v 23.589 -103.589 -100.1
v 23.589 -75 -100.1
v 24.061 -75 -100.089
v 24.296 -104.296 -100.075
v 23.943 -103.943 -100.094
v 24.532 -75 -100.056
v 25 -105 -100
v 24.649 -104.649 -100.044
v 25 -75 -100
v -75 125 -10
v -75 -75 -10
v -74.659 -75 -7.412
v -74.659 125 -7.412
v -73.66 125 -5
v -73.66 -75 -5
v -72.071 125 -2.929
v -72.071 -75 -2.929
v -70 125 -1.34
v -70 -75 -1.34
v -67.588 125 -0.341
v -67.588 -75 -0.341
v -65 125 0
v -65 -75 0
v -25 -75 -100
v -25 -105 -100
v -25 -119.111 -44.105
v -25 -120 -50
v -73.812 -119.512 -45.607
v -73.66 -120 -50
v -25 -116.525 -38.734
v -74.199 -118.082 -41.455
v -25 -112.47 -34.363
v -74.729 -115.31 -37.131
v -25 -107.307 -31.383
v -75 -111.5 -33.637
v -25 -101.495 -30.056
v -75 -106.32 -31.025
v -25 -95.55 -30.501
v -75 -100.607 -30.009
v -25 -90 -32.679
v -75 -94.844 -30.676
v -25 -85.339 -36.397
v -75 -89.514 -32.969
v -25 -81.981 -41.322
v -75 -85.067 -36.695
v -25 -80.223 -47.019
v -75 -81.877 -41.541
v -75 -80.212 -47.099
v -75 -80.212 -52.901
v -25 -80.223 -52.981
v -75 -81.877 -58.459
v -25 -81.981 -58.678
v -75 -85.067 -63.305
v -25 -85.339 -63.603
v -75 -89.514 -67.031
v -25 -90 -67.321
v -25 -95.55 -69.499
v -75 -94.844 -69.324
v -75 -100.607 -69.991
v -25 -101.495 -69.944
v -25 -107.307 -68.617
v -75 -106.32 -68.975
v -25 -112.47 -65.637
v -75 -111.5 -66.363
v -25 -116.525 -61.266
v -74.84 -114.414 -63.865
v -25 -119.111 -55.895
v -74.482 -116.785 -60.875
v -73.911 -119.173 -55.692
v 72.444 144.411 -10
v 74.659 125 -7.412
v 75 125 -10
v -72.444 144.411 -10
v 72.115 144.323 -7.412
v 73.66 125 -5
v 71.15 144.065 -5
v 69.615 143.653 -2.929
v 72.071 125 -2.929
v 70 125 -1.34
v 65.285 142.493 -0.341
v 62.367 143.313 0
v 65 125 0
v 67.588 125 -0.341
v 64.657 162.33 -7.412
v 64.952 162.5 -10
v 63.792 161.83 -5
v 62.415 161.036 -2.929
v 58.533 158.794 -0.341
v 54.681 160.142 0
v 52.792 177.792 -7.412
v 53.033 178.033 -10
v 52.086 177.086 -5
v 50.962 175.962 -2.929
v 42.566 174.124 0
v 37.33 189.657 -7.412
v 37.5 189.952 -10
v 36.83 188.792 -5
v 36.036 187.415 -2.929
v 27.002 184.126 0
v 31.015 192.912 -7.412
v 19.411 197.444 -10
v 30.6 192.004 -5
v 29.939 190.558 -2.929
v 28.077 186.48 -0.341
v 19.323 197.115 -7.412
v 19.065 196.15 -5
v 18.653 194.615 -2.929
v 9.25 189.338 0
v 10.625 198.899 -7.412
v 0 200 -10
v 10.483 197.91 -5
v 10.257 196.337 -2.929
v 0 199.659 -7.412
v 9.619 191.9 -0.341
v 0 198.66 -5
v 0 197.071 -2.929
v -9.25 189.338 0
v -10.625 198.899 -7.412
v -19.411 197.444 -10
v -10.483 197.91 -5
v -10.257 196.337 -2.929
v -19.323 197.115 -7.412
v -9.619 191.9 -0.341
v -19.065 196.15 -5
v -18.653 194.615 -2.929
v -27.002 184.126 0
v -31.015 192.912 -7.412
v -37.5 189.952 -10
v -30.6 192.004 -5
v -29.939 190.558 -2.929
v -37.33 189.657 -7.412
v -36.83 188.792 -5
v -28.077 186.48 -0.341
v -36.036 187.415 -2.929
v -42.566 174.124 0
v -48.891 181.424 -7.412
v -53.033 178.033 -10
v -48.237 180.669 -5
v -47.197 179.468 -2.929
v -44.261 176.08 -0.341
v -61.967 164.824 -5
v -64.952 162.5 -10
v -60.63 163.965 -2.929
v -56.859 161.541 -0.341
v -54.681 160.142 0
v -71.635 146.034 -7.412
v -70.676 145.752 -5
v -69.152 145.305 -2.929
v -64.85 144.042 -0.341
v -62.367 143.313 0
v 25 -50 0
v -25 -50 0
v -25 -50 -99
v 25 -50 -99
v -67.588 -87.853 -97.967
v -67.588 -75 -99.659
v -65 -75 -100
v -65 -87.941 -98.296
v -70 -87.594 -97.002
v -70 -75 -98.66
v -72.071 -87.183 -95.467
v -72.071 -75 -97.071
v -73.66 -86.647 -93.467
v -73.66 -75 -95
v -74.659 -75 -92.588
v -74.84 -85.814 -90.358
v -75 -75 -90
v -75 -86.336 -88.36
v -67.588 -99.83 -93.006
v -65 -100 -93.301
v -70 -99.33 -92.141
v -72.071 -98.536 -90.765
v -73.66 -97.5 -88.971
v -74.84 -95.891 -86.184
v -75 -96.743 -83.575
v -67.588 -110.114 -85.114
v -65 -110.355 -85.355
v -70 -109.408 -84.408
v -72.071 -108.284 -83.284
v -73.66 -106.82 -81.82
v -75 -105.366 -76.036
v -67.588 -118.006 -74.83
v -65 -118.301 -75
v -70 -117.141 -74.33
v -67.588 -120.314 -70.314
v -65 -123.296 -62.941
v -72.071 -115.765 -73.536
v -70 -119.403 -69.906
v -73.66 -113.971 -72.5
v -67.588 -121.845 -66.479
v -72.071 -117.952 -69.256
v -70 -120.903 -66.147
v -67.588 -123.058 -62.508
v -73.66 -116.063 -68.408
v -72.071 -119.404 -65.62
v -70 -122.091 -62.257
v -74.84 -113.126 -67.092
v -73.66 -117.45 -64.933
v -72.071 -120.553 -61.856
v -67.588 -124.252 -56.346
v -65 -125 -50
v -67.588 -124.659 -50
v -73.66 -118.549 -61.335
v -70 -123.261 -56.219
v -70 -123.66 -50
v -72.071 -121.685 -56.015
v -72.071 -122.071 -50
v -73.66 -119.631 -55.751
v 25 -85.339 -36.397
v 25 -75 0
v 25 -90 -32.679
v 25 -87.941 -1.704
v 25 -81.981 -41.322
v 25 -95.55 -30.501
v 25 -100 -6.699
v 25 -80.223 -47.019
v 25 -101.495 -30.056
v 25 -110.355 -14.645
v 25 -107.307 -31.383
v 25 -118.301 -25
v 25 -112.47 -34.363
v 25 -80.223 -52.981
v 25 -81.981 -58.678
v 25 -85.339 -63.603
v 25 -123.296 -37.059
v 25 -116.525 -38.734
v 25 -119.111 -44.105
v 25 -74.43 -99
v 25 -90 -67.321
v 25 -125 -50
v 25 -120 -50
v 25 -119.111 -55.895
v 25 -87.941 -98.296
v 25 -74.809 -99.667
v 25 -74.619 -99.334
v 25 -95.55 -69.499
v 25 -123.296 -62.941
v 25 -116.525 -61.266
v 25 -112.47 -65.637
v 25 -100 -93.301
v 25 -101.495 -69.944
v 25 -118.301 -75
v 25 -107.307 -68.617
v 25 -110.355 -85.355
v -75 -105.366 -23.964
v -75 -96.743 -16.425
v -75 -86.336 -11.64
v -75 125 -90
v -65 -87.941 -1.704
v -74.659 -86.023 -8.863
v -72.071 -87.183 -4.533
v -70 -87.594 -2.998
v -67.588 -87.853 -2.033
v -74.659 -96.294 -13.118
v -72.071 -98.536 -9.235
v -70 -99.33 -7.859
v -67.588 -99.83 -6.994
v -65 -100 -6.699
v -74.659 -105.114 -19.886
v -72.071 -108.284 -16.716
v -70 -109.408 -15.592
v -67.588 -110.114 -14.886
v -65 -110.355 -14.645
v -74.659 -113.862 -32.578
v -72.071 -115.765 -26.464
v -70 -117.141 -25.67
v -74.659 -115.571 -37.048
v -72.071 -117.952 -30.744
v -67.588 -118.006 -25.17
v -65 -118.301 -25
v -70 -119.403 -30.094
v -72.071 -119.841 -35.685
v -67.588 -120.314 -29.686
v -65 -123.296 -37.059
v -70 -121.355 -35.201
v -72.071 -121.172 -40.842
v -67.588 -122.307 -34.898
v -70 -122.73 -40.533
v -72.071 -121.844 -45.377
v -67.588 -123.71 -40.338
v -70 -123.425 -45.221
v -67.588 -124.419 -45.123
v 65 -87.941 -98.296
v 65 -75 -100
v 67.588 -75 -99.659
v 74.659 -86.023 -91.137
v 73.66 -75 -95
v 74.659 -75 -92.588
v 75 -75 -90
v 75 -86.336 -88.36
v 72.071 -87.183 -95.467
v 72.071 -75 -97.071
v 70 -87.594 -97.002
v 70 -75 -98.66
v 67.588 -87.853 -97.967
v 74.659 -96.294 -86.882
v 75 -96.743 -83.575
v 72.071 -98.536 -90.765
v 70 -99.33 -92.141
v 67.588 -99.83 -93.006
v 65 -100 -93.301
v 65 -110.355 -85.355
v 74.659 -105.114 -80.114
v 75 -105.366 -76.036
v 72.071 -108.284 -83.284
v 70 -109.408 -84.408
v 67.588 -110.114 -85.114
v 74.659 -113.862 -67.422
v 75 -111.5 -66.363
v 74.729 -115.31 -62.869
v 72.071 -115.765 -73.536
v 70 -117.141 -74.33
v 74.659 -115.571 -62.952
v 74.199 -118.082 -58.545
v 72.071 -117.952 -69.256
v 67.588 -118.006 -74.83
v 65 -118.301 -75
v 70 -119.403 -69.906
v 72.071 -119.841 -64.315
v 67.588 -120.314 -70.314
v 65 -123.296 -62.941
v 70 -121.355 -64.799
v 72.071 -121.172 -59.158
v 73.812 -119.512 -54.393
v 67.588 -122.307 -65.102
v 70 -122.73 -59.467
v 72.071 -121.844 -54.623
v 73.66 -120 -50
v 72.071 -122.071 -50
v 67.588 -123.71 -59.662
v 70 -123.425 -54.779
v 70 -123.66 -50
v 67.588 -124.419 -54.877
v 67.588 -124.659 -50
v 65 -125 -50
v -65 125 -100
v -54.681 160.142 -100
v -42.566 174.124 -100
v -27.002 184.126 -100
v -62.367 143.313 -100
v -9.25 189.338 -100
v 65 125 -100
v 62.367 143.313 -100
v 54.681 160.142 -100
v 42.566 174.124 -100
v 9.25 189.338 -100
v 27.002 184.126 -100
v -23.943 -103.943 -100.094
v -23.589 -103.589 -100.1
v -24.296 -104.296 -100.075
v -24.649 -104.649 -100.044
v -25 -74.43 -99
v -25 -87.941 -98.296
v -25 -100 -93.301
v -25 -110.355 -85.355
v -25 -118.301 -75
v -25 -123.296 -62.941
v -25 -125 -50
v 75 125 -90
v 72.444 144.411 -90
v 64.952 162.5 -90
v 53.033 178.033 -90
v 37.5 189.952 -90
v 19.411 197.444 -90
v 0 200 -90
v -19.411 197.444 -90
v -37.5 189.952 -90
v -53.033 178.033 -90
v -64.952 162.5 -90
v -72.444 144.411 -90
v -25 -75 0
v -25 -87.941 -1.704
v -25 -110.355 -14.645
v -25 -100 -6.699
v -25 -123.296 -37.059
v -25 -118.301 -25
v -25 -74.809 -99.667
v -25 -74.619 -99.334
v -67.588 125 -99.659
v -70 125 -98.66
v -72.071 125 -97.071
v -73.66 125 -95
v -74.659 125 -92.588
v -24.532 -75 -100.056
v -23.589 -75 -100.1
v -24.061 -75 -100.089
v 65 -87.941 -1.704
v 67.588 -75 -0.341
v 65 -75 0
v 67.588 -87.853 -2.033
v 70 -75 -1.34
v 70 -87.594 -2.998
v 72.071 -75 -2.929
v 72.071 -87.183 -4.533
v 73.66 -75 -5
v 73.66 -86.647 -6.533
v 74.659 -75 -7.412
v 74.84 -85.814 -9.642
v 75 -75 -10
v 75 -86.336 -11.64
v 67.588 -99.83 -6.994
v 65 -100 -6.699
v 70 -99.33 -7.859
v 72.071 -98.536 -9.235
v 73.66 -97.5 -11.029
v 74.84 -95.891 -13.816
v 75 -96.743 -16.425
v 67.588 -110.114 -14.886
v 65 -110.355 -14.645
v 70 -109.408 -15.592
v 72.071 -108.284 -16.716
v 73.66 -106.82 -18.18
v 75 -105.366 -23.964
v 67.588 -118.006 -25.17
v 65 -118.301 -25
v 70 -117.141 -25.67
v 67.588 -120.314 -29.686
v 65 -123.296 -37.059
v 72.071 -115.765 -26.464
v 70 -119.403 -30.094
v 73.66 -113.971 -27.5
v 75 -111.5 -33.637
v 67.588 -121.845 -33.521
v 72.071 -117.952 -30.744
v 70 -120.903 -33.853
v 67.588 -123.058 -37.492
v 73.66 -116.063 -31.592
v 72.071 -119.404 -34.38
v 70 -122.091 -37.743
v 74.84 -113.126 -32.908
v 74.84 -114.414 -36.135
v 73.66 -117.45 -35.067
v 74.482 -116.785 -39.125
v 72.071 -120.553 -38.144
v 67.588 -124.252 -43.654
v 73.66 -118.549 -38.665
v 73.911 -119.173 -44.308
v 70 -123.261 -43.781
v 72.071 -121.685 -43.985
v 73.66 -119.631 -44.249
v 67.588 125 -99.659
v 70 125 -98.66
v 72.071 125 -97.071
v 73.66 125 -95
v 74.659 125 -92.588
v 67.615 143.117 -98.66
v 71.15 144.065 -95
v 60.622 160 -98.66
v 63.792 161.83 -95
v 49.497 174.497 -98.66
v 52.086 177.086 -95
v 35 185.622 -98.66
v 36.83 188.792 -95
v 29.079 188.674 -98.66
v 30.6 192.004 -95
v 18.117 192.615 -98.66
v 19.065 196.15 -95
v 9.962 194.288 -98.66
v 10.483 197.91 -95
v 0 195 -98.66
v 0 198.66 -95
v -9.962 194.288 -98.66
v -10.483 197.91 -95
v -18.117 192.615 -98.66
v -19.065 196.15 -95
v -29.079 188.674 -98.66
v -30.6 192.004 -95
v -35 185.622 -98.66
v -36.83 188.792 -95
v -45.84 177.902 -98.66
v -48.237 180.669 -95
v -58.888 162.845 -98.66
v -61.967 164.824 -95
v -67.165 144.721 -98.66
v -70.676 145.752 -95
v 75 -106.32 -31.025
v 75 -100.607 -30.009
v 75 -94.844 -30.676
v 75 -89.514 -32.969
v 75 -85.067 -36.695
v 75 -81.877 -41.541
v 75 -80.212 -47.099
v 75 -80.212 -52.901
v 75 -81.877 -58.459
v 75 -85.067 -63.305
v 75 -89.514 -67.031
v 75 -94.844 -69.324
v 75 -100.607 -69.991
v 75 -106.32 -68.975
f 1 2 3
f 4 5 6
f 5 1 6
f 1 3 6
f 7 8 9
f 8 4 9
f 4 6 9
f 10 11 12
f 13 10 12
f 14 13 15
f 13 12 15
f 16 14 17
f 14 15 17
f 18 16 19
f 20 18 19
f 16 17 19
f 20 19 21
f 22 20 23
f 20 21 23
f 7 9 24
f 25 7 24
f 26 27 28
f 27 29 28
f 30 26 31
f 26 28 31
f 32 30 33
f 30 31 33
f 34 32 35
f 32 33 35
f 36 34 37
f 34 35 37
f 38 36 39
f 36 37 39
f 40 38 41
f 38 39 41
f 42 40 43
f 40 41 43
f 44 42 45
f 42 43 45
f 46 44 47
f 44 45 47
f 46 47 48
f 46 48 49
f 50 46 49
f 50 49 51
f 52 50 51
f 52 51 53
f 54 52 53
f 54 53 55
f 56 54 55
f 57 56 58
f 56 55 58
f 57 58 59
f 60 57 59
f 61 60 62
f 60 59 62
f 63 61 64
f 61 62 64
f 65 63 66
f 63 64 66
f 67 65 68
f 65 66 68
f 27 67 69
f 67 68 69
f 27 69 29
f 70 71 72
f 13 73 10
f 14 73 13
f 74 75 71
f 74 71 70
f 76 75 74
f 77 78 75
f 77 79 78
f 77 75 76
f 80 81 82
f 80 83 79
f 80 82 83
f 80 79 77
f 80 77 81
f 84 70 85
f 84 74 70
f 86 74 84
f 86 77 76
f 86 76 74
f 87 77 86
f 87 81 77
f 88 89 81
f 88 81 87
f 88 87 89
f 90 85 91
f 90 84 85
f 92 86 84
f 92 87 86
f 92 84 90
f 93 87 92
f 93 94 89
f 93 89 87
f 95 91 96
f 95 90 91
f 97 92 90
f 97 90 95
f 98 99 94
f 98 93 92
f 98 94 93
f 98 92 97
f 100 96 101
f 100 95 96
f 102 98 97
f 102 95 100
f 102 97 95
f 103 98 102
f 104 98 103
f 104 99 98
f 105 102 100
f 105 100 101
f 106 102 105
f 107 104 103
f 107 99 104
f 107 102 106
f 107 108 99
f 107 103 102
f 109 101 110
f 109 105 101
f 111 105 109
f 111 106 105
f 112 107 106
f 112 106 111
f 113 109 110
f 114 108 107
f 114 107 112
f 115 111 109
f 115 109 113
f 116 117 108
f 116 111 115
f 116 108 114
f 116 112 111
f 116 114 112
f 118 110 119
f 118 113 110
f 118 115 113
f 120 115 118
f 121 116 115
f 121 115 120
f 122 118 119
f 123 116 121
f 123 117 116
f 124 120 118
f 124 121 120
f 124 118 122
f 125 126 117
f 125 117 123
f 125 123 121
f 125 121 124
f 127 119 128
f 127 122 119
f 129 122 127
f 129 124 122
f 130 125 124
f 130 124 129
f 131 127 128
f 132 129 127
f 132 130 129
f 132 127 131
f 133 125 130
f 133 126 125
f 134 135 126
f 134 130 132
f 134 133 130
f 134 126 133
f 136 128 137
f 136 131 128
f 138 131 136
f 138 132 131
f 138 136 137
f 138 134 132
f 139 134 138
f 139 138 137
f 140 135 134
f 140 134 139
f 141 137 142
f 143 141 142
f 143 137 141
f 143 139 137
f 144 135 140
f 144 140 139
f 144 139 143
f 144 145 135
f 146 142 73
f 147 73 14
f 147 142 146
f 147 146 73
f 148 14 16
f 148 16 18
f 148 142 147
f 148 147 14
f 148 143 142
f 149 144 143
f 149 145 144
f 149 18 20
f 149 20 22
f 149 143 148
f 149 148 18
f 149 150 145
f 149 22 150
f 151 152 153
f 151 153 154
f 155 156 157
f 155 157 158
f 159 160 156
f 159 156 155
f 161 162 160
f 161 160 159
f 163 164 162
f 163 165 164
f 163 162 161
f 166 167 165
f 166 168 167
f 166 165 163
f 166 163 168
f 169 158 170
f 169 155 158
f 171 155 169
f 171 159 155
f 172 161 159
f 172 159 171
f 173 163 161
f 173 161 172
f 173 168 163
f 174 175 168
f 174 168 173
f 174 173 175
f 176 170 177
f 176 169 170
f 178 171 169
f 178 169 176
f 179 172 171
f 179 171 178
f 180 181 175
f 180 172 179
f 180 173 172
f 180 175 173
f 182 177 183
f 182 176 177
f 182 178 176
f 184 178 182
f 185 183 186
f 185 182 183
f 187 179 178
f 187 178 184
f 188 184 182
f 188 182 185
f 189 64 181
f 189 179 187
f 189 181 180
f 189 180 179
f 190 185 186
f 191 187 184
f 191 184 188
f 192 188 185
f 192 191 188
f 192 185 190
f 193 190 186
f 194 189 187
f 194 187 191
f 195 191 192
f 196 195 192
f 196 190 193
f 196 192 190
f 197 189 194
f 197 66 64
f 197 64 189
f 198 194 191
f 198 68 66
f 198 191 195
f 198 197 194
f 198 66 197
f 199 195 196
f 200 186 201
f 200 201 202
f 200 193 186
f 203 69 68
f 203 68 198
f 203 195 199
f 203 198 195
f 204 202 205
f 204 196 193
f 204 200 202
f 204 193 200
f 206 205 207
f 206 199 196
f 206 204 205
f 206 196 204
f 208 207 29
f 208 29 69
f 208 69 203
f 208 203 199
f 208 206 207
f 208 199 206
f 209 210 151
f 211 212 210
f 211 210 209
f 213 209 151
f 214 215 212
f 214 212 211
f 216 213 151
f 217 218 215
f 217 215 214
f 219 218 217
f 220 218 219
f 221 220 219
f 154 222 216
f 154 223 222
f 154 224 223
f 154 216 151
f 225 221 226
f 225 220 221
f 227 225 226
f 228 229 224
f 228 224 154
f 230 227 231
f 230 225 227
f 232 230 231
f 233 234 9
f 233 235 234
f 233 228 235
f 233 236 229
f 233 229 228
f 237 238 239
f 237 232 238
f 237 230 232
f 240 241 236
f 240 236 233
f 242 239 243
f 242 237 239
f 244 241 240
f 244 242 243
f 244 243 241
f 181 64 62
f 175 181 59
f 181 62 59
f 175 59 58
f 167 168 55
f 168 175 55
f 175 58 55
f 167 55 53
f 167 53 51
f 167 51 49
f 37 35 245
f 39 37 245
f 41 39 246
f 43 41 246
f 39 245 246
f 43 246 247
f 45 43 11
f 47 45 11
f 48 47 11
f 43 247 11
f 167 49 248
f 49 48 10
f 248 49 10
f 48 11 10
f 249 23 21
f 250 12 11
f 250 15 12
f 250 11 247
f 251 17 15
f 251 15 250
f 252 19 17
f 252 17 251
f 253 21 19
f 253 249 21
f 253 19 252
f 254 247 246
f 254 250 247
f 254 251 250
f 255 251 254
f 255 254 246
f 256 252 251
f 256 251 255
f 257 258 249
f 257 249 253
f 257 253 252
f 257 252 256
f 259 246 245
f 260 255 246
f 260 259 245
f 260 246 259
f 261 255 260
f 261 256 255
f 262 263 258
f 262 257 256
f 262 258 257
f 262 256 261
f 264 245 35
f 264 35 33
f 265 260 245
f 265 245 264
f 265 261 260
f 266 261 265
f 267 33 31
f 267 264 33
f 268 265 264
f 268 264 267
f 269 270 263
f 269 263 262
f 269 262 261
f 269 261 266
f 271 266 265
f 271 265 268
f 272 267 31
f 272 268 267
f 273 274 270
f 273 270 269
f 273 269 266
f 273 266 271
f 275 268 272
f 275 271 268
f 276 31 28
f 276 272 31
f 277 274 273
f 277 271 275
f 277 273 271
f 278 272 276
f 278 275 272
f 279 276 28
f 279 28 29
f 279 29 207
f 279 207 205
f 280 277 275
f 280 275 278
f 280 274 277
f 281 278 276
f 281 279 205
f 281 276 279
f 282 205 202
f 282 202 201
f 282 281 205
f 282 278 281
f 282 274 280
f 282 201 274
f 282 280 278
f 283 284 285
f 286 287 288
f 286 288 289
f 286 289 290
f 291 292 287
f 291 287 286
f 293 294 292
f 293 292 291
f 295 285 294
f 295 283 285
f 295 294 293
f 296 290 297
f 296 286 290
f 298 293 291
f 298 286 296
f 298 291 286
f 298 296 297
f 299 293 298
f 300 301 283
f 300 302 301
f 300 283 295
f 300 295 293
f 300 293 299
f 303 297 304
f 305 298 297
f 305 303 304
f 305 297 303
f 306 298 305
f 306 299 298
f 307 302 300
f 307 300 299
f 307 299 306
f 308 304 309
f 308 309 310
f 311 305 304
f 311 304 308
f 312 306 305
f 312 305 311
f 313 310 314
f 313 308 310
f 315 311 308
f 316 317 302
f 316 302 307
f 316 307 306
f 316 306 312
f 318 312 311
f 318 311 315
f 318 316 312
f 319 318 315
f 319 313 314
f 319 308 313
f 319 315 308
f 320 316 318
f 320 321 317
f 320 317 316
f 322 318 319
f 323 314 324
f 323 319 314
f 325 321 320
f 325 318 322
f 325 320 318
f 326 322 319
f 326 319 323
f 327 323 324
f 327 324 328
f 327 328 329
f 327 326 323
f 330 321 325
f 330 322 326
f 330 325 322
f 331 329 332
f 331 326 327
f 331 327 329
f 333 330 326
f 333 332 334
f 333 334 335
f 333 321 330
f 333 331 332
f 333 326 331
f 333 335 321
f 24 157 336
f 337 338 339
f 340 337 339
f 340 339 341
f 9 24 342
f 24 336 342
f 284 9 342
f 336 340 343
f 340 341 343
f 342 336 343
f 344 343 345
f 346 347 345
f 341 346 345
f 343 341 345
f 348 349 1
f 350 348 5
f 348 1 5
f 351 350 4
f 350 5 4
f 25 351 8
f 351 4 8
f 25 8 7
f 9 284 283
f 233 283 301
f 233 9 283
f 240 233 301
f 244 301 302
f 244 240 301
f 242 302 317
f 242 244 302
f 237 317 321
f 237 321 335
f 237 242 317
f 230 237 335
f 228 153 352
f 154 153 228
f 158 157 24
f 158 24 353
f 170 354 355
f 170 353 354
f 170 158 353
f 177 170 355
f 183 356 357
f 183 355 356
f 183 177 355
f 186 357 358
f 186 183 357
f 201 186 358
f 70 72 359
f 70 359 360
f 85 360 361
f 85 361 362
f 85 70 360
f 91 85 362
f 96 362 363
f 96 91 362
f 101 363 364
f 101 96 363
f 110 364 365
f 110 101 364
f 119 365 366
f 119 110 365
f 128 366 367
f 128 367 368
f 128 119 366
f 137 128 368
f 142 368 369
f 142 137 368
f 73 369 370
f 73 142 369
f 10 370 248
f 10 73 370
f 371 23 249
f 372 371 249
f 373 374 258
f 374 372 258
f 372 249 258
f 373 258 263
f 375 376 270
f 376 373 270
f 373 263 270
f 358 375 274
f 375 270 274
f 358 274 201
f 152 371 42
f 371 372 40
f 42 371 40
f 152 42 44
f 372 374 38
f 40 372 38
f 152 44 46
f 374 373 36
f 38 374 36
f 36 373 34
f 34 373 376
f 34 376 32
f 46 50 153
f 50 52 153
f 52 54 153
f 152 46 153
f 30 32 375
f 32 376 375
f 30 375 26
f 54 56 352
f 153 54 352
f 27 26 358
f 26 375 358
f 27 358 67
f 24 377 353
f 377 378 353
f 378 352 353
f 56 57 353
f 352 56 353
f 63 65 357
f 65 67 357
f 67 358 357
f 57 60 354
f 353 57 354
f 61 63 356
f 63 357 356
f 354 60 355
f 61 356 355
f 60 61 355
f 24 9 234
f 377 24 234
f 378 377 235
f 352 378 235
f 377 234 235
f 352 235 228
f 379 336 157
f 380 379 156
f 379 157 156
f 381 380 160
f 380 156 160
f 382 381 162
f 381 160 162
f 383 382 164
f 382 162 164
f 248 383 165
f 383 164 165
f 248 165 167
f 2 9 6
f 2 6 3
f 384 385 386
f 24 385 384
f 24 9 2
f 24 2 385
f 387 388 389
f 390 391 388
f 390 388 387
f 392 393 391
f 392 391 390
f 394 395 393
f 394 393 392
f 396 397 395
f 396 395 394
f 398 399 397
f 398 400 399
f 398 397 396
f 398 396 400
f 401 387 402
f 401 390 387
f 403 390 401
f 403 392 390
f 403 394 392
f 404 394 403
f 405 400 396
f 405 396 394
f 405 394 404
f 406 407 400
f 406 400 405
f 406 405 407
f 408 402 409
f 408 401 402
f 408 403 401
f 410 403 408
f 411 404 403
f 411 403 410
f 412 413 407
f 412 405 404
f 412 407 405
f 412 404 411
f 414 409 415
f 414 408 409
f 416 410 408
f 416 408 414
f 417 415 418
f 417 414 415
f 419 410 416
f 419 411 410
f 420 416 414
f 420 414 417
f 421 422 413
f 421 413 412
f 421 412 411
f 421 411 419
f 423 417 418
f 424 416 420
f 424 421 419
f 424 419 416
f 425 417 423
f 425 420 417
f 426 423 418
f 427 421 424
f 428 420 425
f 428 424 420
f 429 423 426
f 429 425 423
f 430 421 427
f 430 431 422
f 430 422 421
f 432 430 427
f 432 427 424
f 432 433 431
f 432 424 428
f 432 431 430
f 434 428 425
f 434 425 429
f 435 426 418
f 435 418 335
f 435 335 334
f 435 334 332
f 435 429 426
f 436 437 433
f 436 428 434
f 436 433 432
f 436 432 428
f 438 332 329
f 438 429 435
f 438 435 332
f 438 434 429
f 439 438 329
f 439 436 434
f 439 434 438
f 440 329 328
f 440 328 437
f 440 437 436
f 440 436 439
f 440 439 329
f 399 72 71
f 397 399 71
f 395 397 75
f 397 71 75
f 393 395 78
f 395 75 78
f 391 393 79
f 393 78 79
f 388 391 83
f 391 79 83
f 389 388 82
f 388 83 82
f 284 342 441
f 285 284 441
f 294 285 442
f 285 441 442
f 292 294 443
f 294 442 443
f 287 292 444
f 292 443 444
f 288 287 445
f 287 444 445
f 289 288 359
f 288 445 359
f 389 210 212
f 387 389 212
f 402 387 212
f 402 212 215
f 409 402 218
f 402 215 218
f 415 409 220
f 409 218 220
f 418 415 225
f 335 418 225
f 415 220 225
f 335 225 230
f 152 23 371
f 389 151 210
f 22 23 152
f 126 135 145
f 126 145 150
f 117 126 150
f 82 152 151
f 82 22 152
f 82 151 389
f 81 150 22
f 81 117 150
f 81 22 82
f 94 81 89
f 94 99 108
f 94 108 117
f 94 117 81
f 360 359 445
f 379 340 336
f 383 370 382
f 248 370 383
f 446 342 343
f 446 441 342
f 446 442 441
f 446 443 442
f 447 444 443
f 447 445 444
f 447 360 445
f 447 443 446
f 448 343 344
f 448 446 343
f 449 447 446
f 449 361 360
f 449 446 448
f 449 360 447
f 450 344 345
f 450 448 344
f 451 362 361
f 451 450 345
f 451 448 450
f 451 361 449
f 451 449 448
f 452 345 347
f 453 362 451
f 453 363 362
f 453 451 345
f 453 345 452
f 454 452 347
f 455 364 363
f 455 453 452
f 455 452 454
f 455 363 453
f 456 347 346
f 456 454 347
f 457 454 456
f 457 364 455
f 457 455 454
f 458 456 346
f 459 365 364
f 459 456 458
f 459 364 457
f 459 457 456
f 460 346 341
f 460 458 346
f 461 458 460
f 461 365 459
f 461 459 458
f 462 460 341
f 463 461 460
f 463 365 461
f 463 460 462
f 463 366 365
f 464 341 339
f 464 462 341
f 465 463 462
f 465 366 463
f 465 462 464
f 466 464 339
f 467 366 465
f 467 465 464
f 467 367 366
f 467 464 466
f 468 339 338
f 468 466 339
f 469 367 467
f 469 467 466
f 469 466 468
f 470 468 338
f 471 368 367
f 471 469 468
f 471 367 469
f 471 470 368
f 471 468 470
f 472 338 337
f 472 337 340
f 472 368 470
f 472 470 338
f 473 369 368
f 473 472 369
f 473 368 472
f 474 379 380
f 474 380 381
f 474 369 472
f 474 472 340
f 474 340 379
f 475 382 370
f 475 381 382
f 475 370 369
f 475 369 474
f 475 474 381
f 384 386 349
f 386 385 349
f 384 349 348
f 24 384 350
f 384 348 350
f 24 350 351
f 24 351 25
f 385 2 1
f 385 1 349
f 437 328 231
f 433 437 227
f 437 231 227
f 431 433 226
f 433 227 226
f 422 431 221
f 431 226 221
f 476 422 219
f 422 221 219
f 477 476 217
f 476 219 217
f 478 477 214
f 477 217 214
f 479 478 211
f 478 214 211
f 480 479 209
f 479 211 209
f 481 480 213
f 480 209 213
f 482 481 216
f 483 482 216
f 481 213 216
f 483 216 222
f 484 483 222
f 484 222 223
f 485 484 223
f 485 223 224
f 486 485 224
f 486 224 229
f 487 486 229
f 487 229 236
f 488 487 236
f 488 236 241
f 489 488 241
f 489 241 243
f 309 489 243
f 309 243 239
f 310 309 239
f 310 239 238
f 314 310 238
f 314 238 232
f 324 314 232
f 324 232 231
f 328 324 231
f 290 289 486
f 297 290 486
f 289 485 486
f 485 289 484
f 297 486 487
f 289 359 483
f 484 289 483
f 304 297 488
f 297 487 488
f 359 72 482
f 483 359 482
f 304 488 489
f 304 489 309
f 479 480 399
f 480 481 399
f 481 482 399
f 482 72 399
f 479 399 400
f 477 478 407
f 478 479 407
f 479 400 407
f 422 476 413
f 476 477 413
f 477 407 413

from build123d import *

# Parameters (mm, degrees)
BOSS_EXTRUDE1_DEPTH    = 100
SKETCH2_W              = 50
SKETCH2_H              = 50
CUT_EXTRUDE1_DEPTH     = 177.776695297
CUT_EXTRUDE2_DEPTH     = 25
SKETCH7_R              = 20
CUT_EXTRUDE3_DEPTH     = 220.374109685
FILLET2_R              = 50
CUT_EXTRUDE6_START     = -125
CUT_EXTRUDE6_OUTLINE_W = 50
CUT_EXTRUDE6_OUTLINE_H = 6.698729811
CUT_EXTRUDE6_DEPTH     = 50
CUT_EXTRUDE7_DEPTH     = 25
BOSS_EXTRUDE2_DEPTH    = 100
FILLET4_R              = 10
SKETCH11_W             = 50
SKETCH11_H             = 25
CUT_EXTRUDE11_DEPTH    = 99
SKETCH16_W             = 50
SKETCH16_H             = 30
BOSS_EXTRUDE3_DEPTH    = 0.1
FILLET5_R              = 10


with BuildPart() as part:
    # Sketch1 → Boss-Extrude1 (new body)
    with BuildSketch(Plane.XY):
        Polygon((-75, 125), (0.2, 125), (49.8, 125), (75, 125), (75, -125), (-75, -125), align=None)
    extrude(amount=-BOSS_EXTRUDE1_DEPTH)

    # Sketch2 → Cut-Extrude1 (cut, through all)
    with BuildSketch(Plane.XY):
        with Locations((0, -125)):
            Rectangle(SKETCH2_W, SKETCH2_H)
    extrude(amount=-CUT_EXTRUDE1_DEPTH, mode=Mode.SUBTRACT)

    # Sketch6 → Cut-Extrude2 (cut, symmetric)
    with BuildSketch(Plane(origin=(0, 0, 0), x_dir=(0, 0, -1), z_dir=(1, 0, 0))):
        with BuildLine():
            Line((100, -100), (0, -100))
            ThreePointArc((0, -100), (50, -50), (100, -100))
        make_face()
    extrude(amount=CUT_EXTRUDE2_DEPTH, both=True, mode=Mode.SUBTRACT)

    # Sketch7 → Cut-Extrude3 (cut, through all)
    with BuildSketch(Plane.ZY.offset(75)):
        with Locations(Location((-50, -100, 0), (0, 0, 270))):
            Circle(SKETCH7_R)
    extrude(amount=-CUT_EXTRUDE3_DEPTH, mode=Mode.SUBTRACT)

    # Fillet2
    fillet2_edges = [part.edges().sort_by_distance(p)[0] for p in [
        (-50, -125, -100),
        (-50, -125, 0),
    ]]
    fillet(fillet2_edges, radius=FILLET2_R - 0.0001)  # a hair under: the kernel refuses the full size

    # Cut-Extrude6: read off the stored shape, not the designer's step
    # Cut-Extrude6 outline → Cut-Extrude6 (cut)
    with BuildSketch(Plane(origin=(0, 0, 0), x_dir=(1, 0, 0), z_dir=(0, 1, 0)).offset(CUT_EXTRUDE6_START)):
        with Locations((0, 96.650635095)):
            Rectangle(CUT_EXTRUDE6_OUTLINE_W, CUT_EXTRUDE6_OUTLINE_H)
        with Locations((0, 3.349364906)):
            Rectangle(CUT_EXTRUDE6_OUTLINE_W, CUT_EXTRUDE6_OUTLINE_H)
    extrude(amount=CUT_EXTRUDE6_DEPTH, mode=Mode.SUBTRACT)

    # Sketch10 → Cut-Extrude7 (cut, symmetric)
    with BuildSketch(Plane(origin=(0, 0, 0), x_dir=(0, 0, -1), z_dir=(1, 0, 0))):
        with BuildLine():
            Line((0, -75), (100, -75))
            ThreePointArc((100, -75), (50, -61.602540378), (0, -75))
        make_face()
    extrude(amount=CUT_EXTRUDE7_DEPTH, both=True, mode=Mode.SUBTRACT)

    # Sketch15 → Boss-Extrude2 (add)
    with BuildSketch(Plane.XY):
        with BuildLine():
            Line((-75, 125), (75, 125))
            ThreePointArc((75, 125), (0, 200), (-75, 125))
        make_face()
    extrude(amount=-BOSS_EXTRUDE2_DEPTH)

    # Fillet4
    # the kernel refuses this fillet: 10 mm, written as the material it takes off along each edge
    with BuildSketch(Plane(origin=(0, 125, -100), x_dir=(1, 0, 0), z_dir=(0, -1, 0))) as fillet4_piece_1:
        with BuildLine():
            CenterArc((75 - FILLET4_R, FILLET4_R), FILLET4_R, 270, 90)
            Line((75, FILLET4_R), (75, 0))
            Line((75, 0), (75 - FILLET4_R, 0))
        make_face()
    revolve(axis=Axis((0, 125, -100), (0, 0, 1)), revolution_arc=180, mode=Mode.SUBTRACT)
    with BuildSketch(Plane(origin=(0, 125, 0), x_dir=(1, 0, 0), z_dir=(0, -1, 0))) as fillet4_piece_2:
        with BuildLine():
            CenterArc((75 - FILLET4_R, -FILLET4_R), FILLET4_R, 0, 90)
            Line((75, -FILLET4_R), (75, 0))
            Line((75, 0), (75 - FILLET4_R, 0))
        make_face()
    revolve(axis=Axis((0, 125, 0), (0, 0, 1)), revolution_arc=180, mode=Mode.SUBTRACT)
    with BuildSketch(Plane(origin=(-75, -75.0001, -100), x_dir=(0, 0, 1), z_dir=(0, 1, 0)), Plane(origin=(75, 125, 0), x_dir=(-1, 0, 0), z_dir=(0, -1, 0))) as fillet4_piece_3:
        with BuildLine():
            CenterArc((FILLET4_R, FILLET4_R), FILLET4_R, 180, 90)
            Line((0, FILLET4_R), (0, 0))
            Line((0, 0), (FILLET4_R, 0))
        make_face()
    extrude(amount=200.0001, mode=Mode.SUBTRACT)
    with BuildSketch(Plane(origin=(75, 125, -100), x_dir=(-1, 0, 0), z_dir=(0, -1, 0)), Plane(origin=(-75, -75.0001, 0), x_dir=(0, 0, -1), z_dir=(0, 1, 0))) as fillet4_piece_4:
        with BuildLine():
            CenterArc((FILLET4_R, -FILLET4_R), FILLET4_R, 90, 90)
            Line((0, -FILLET4_R), (0, 0))
            Line((0, 0), (FILLET4_R, 0))
        make_face()
    extrude(amount=200.0001, mode=Mode.SUBTRACT)
    with BuildSketch(Plane(origin=(75, -75.0001, -49.9999), x_dir=(0, 0, 1), z_dir=(0, 1, 0))) as fillet4_piece_5:
        with BuildLine():
            CenterArc((49.9999 - FILLET4_R, -FILLET4_R), FILLET4_R, 0, 90)
            Line((49.9999 - FILLET4_R, 0), (49.9999, 0))
            Line((49.9999, 0), (49.9999, -FILLET4_R))
        make_face()
    revolve(axis=Axis((75, -75.0001, -49.9999), (1, 0, 0)), revolution_arc=90, mode=Mode.SUBTRACT)
    with BuildSketch(Plane(origin=(75, -75.0001, -50.0001), x_dir=(0, 0, -1), z_dir=(0, 1, 0))) as fillet4_piece_6:
        with BuildLine():
            CenterArc((49.9999 - FILLET4_R, FILLET4_R), FILLET4_R, 270, 90)
            Line((49.9999, FILLET4_R), (49.9999, 0))
            Line((49.9999, 0), (49.9999 - FILLET4_R, 0))
        make_face()
    revolve(axis=Axis((75, -75.0001, -50.0001), (-1, 0, 0)), revolution_arc=90, mode=Mode.SUBTRACT)
    with BuildSketch(Plane(origin=(-75, -75.0001, -49.9999), x_dir=(0, 0, 1), z_dir=(0, 1, 0))) as fillet4_piece_7:
        with BuildLine():
            CenterArc((49.9999 - FILLET4_R, FILLET4_R), FILLET4_R, 270, 90)
            Line((49.9999, FILLET4_R), (49.9999, 0))
            Line((49.9999, 0), (49.9999 - FILLET4_R, 0))
        make_face()
    revolve(axis=Axis((-75, -75.0001, -49.9999), (1, 0, 0)), revolution_arc=90, mode=Mode.SUBTRACT)
    with BuildSketch(Plane(origin=(-75, -75.0001, -50.0001), x_dir=(0, 0, -1), z_dir=(0, 1, 0))) as fillet4_piece_8:
        with BuildLine():
            CenterArc((49.9999 - FILLET4_R, -FILLET4_R), FILLET4_R, 0, 90)
            Line((49.9999, -FILLET4_R), (49.9999, 0))
            Line((49.9999, 0), (49.9999 - FILLET4_R, 0))
        make_face()
    revolve(axis=Axis((-75, -75.0001, -50.0001), (-1, 0, 0)), revolution_arc=90, mode=Mode.SUBTRACT)
    with BuildSketch(Plane(origin=(-75, -125, -49.9999), x_dir=(0, 1, 0), z_dir=(0, 0, -1))) as fillet4_piece_9:
        with BuildLine():
            CenterArc((FILLET4_R, FILLET4_R), FILLET4_R, 180, 90)
            Line((0, FILLET4_R), (0, 0))
            Line((0, 0), (FILLET4_R, 0))
        make_face()
    extrude(amount=0.0002, mode=Mode.SUBTRACT)
    with BuildSketch(Plane(origin=(75, -125, -49.9999), x_dir=(0, 1, 0), z_dir=(0, 0, -1))) as fillet4_piece_10:
        with BuildLine():
            CenterArc((FILLET4_R, -FILLET4_R), FILLET4_R, 90, 90)
            Line((0, -FILLET4_R), (0, 0))
            Line((0, 0), (FILLET4_R, 0))
        make_face()
    extrude(amount=0.0002, mode=Mode.SUBTRACT)

    # Sketch11 → Cut-Extrude11 (cut)
    with BuildSketch(Plane.XY):
        with Locations((0, -62.5)):
            Rectangle(SKETCH11_W, SKETCH11_H)
    extrude(amount=-CUT_EXTRUDE11_DEPTH, mode=Mode.SUBTRACT)


with BuildPart() as body_2:
    # Sketch16 → Boss-Extrude3 (new body)
    with BuildSketch(Plane(origin=(0, 0, -100), x_dir=(-1, 0, 0), z_dir=(0, 0, -1))):
        with Locations((0, -90)):
            Rectangle(SKETCH16_W, SKETCH16_H)
    extrude(amount=BOSS_EXTRUDE3_DEPTH)

    # Fillet5
    # the kernel refuses this fillet: 10 mm, written as the material it takes off along each edge
    with BuildSketch(Plane(origin=(25, -71.473316005, -100.1), x_dir=(0, 0, 1), z_dir=(0, -1, 0)), Plane(origin=(-25, -108.526683995, -100.1), x_dir=(0, 0, 1), z_dir=(0, 1, 0))) as fillet5_piece_1:
        with BuildLine():
            CenterArc((10, 1.410673598), FILLET5_R, 180, 8.109614456)
            Line((0, 1.410673598), (0, 0))
            Line((0, 0), (0.1, 0))
        make_face()
    extrude(amount=37.05336799, mode=Mode.SUBTRACT)
    with BuildSketch(Plane(origin=(28.526683995, -105, -100.1), x_dir=(0, 0, 1), z_dir=(-1, 0, 0))) as fillet5_piece_2:
        with BuildLine():
            CenterArc((10, 1.410673598), FILLET5_R, 180, 8.109614456)
            Line((0, 1.410673598), (0, 0))
            Line((0, 0), (0.1, 0))
        make_face()
    extrude(amount=57.05336799, mode=Mode.SUBTRACT)


solid = Compound([part.part, body_2.part])
